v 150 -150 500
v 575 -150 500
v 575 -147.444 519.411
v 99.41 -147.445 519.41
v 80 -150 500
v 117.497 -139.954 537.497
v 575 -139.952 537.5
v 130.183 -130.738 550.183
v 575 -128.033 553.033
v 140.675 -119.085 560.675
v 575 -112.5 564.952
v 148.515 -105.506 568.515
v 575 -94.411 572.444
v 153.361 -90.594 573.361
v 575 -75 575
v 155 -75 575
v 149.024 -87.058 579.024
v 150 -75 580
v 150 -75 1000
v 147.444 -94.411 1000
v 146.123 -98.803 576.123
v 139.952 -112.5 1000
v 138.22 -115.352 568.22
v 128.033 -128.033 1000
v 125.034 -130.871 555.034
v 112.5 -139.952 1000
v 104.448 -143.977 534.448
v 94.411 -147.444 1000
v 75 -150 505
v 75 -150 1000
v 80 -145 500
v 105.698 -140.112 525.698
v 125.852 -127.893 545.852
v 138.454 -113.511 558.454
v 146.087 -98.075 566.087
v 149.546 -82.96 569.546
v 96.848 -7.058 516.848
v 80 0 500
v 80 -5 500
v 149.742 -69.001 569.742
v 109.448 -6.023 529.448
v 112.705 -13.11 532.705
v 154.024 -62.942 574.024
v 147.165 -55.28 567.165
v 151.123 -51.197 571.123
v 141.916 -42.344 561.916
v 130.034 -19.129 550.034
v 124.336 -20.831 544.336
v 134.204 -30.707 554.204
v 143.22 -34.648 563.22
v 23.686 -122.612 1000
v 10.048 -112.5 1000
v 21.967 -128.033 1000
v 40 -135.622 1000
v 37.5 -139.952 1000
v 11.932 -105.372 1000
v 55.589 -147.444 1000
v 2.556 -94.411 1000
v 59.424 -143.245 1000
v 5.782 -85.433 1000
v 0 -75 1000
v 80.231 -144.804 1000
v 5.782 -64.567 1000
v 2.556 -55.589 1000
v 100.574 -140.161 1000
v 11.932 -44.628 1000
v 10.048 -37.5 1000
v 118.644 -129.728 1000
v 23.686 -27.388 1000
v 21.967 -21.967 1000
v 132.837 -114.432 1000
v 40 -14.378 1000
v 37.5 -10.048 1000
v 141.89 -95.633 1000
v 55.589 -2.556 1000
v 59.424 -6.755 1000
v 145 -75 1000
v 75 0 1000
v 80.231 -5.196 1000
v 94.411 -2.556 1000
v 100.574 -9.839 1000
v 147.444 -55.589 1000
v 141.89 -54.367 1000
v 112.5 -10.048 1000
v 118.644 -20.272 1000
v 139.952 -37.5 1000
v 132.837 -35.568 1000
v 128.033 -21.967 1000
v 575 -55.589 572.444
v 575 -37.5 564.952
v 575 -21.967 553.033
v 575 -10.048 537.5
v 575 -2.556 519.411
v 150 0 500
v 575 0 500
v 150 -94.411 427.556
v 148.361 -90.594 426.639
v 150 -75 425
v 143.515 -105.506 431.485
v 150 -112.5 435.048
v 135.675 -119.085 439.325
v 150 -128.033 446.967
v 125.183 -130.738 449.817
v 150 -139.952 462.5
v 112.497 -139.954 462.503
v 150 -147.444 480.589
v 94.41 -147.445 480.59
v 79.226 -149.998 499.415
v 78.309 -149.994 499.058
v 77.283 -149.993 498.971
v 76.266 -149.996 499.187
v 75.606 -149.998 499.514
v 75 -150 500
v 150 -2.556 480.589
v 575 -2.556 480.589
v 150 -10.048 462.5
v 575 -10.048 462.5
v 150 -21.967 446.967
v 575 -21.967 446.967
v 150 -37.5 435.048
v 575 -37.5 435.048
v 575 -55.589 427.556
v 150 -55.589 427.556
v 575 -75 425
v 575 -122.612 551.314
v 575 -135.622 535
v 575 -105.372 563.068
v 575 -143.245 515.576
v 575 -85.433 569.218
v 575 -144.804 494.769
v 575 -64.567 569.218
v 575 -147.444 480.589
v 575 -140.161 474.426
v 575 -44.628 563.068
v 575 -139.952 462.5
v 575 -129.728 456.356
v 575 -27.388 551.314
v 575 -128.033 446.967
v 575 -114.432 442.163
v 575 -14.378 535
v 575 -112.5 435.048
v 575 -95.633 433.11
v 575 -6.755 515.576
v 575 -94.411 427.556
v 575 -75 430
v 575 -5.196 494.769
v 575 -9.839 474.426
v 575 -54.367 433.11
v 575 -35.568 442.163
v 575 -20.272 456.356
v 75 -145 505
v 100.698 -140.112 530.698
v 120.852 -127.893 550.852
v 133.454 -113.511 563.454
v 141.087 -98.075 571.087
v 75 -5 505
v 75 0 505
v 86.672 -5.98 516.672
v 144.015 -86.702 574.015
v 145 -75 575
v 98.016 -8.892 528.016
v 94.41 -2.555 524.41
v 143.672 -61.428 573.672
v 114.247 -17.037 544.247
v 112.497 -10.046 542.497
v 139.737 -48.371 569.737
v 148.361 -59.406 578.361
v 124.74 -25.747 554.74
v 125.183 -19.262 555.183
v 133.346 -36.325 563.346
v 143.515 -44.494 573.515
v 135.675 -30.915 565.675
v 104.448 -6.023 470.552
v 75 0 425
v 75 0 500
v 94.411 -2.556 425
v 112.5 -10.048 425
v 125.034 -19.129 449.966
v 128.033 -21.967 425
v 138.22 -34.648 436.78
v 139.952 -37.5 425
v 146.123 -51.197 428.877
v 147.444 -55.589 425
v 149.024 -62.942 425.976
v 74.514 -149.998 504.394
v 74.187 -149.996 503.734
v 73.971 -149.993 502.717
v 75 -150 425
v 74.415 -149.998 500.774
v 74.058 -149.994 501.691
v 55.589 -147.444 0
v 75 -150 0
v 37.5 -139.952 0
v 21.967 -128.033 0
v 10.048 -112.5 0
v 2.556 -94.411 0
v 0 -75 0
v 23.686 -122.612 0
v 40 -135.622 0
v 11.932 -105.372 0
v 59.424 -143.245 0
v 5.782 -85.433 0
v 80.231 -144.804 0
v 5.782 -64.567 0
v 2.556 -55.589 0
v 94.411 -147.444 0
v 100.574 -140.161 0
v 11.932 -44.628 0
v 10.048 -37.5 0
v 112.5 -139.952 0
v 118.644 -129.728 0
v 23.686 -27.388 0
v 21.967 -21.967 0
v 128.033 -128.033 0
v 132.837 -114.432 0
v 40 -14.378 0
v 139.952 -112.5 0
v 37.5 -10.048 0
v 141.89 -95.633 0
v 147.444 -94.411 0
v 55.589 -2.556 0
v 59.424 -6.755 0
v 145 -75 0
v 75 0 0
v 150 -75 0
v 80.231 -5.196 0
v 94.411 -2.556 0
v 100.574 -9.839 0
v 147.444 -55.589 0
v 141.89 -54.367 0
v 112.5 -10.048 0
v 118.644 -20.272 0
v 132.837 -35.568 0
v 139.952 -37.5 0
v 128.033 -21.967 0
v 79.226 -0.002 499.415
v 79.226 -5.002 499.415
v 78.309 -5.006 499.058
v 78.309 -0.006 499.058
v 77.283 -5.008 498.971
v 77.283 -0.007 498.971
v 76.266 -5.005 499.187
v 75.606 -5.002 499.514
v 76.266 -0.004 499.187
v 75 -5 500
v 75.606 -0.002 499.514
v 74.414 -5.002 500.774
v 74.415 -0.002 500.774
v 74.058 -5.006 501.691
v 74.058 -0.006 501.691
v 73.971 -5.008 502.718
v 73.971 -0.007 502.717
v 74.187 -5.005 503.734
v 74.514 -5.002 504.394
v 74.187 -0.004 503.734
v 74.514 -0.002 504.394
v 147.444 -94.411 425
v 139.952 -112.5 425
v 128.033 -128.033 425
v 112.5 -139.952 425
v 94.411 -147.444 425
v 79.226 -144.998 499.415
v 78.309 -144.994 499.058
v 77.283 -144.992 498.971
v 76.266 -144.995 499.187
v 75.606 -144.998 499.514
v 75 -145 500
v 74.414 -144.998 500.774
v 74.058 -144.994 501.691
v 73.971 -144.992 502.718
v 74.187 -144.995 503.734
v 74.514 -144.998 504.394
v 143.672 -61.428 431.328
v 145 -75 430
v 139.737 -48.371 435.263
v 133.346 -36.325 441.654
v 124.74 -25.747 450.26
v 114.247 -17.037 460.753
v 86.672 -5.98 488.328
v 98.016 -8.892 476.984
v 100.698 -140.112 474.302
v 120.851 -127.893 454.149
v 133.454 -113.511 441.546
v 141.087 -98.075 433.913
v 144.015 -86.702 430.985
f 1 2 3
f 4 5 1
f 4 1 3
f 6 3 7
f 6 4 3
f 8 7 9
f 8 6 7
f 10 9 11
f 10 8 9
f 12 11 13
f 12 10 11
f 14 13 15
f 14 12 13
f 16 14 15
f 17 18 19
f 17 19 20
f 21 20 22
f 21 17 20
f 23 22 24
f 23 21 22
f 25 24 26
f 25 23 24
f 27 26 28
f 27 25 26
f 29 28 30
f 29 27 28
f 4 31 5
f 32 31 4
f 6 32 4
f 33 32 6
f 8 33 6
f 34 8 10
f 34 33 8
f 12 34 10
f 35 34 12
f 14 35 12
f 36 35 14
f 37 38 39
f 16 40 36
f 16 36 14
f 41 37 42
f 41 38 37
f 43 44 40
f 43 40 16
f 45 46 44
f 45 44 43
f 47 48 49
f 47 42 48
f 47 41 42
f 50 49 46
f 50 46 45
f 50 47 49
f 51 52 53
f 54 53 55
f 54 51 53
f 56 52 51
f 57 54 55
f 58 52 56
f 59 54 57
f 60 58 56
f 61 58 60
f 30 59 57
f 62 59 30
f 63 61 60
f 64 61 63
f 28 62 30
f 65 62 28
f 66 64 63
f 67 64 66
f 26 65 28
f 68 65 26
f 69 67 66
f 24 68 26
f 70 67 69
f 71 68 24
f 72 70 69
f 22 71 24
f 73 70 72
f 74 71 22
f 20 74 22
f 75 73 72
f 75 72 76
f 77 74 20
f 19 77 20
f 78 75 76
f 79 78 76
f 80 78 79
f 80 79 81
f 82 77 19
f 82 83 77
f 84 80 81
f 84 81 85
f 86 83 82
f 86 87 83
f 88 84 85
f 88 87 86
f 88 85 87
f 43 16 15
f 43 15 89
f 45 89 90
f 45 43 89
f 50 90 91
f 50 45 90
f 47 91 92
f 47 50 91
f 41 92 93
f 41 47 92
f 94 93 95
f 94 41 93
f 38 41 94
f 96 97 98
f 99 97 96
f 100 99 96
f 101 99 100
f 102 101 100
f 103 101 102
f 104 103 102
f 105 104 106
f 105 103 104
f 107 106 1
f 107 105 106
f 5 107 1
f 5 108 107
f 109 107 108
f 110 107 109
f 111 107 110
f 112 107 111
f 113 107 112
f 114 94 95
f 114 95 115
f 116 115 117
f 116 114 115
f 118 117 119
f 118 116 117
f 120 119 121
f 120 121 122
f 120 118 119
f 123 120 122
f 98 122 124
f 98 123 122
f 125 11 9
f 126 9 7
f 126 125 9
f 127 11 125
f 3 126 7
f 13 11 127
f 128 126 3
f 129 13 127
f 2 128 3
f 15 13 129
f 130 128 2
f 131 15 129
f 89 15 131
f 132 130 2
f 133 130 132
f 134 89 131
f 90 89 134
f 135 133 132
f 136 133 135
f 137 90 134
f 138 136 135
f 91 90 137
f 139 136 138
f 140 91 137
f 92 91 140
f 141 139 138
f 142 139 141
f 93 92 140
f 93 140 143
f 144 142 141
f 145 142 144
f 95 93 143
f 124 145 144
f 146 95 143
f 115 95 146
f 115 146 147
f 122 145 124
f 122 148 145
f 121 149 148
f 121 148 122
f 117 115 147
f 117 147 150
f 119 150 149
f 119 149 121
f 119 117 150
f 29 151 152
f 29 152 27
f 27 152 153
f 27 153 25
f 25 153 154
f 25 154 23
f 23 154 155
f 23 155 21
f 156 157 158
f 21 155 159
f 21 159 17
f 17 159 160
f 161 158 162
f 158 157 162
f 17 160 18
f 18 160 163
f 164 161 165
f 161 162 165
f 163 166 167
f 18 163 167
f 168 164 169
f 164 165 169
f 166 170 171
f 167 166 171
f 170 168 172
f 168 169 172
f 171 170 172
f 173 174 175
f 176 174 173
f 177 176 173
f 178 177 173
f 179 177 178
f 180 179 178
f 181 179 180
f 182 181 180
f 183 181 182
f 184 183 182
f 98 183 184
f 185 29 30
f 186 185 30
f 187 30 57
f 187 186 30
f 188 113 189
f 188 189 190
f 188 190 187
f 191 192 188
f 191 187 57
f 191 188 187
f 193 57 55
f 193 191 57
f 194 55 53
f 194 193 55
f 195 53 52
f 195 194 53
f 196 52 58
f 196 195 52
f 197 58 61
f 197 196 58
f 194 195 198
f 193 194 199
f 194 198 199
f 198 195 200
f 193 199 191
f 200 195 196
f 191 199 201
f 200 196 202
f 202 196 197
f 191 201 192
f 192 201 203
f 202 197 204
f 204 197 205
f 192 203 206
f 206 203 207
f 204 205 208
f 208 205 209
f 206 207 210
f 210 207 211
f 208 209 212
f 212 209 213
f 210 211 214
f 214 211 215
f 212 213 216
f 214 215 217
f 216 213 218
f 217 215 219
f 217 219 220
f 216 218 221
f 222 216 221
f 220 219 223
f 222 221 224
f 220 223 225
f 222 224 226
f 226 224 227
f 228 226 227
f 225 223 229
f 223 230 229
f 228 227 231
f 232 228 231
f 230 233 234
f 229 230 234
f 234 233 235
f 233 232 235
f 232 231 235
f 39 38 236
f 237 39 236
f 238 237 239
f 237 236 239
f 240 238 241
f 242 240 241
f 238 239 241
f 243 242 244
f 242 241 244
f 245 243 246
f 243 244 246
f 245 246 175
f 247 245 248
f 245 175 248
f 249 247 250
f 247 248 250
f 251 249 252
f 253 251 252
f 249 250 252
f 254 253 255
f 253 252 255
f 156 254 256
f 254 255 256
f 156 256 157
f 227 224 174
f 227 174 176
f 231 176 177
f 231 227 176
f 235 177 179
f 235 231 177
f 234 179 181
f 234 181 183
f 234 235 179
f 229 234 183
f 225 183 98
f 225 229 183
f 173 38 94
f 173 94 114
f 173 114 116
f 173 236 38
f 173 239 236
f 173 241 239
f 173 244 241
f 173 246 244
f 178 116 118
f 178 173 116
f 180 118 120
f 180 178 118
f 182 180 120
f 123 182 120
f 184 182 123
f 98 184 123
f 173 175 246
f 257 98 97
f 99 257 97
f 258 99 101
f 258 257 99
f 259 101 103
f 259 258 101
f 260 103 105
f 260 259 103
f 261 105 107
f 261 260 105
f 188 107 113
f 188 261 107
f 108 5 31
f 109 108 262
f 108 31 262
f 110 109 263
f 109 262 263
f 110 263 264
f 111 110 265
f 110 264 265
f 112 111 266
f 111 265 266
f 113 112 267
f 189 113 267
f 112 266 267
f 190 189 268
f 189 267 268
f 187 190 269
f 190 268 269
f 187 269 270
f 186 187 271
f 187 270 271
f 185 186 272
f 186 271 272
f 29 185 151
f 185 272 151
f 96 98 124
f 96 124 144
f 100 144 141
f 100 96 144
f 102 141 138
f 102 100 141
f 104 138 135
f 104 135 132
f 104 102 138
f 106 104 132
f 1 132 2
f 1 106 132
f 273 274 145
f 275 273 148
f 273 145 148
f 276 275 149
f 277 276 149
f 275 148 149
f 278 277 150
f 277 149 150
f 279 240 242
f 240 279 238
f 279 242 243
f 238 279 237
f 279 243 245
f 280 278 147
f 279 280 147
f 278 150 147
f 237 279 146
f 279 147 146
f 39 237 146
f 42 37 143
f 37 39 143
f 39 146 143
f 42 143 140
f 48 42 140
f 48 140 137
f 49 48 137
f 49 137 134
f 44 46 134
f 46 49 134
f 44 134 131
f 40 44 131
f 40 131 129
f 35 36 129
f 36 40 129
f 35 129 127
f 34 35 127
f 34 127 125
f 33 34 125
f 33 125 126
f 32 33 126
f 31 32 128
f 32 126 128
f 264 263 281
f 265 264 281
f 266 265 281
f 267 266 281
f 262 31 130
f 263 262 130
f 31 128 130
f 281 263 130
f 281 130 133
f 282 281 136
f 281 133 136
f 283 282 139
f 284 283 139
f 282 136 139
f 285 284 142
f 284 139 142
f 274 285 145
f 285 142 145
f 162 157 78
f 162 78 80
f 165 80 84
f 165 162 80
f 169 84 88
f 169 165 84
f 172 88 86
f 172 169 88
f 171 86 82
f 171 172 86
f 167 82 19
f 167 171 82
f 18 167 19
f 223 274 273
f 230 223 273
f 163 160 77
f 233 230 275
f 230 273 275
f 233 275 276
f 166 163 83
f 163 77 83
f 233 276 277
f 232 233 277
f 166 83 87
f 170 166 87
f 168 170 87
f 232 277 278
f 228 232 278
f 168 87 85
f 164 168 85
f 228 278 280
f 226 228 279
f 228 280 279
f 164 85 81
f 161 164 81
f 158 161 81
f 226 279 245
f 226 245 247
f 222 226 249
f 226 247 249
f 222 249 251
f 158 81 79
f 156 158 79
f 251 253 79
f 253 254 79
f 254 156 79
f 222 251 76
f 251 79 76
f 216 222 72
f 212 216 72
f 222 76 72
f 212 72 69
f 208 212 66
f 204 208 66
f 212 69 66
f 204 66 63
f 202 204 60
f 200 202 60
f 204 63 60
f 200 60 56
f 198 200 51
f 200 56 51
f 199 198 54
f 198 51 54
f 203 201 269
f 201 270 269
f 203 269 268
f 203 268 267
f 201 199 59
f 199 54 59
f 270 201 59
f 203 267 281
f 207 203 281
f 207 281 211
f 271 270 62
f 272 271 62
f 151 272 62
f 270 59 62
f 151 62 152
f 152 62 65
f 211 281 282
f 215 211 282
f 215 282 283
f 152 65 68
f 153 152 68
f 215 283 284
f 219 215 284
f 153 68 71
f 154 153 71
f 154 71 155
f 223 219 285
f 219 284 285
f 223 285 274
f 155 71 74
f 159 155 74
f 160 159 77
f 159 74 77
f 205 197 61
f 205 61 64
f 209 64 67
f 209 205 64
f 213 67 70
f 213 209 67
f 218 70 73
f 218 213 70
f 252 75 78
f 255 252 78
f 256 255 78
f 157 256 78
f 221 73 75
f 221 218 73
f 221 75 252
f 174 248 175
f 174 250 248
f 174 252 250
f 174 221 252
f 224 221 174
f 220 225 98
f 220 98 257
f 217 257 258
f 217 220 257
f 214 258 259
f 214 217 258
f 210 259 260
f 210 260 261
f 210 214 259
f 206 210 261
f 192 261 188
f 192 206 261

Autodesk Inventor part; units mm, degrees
ref_plane "YZ Plane" through (0, 0, 0) normal (1, 0, 0) x (0, 1, 0)
ref_plane "XZ Plane" through (0, 0, 0) normal (0, 1, 0) x (-1, 0, 0)
ref_plane "XY Plane" through (0, 0, 0) normal (0, 0, 1) x (1, 0, 0)
sketch "Эскиз1" plane through (0, 0, 0) normal (0, 0, 1) x (1, 0, 0)
  line L0 (0, 0) -> (150, 0)
  line L1 (150, 0) -> (150, -150)
  line L2 (150, -150) -> (0, -150)
  line L3 (0, -150) -> (0, 0)
  dimension "d0" = 150
  dimension "d1" = 150
extrude "Выдавливание1" add sketch "Эскиз1" along normal blind 1000
sketch "Эскиз2" plane through (150, -150, 0) normal (1, 0, 0) x (0, 0, -1)
  line L0 (0, 0) -> (-1000, 0) projected
  line L1 (0, 150) -> (-1000, 150) projected
  line L2 (-575, 0) -> (-425, 0)
  line L3 (-425, 0) -> (-425, 150)
  line L4 (-425, 150) -> (-575, 150)
  line L5 (-575, 150) -> (-575, 0)
  point P0 (-500, 0)
  point P1 (-500, 0)
  point P2 (-425, 0)
  dimension "d4" = 150
  dimension "d5" = 0
extrude "Выдавливание2" add sketch "Эскиз2" along normal blind 425
sketch "Эскиз3" plane through (0, 0, 0) normal (0, 1, 0) x (1, 0, 0)
  line L0 (150, -425) -> (575, -425) projected
  line L1 (150, -575) -> (575, -575) projected
  line L2 (150, -425) -> (150, -575)
  line L3 (150, -500) -> (0, -500)
  line L4 (0, 0) -> (0, -1000) projected
  line L5 (75, -500) -> (150, -575)
  line L6 (80, -500) -> (155, -575)
  line L7 (70, -500) -> (150, -580)
  line L8 (150, -575) -> (150, -1000) projected
  circle A0 centre (77.5, -502.5) radius 3.5355
  point P0 (150, -570)
  point P1 (75, -505)
  dimension "d8" = 5
  dimension "d9" = 5
extrude "Выдавливание3" cut sketch "Эскиз3" against normal blind 200 contours L2 L6 L1 | L5 A0 L6 L2 | L8 L7 A0 L5 | A0 L5 | L5 L3 A0 | L3 A0
fillet "Сопряжение1" radius 75 10 edges at (365, 0, 575) (362.5, 0, 425) (365, -150, 575) (362.5, -150, 425) (150, -150, 212.5) (150, 0, 212.5) (150, 0, 790) (150, -150, 790) (0, -150, 500) (0, 0, 500)
sketch "Эскиз4" plane through (75, -75, 1000) normal (0, 0, 1) x (1, 0, 0)
  line L0 (0, 75) -> (0, -75) projected
  circle A0 centre (0, 0) radius 70
  point P0 (-75, 75)
  dimension "d13" = 140
extrude "Выдавливание4" cut sketch "Эскиз4" against normal blind 1010
sketch "Эскиз5" plane through (575, -75, 500) normal (1, 0, 0) x (0, 0, -1)
  circle A0 centre (0, 0) radius 70
  point P0 (500, 75)
  dimension "d16" = 140
extrude "Выдавливание5" cut sketch "Эскиз5" against normal blind 500
properties part number "вставка в трубу" material "Полистирол, высокопрочный"
